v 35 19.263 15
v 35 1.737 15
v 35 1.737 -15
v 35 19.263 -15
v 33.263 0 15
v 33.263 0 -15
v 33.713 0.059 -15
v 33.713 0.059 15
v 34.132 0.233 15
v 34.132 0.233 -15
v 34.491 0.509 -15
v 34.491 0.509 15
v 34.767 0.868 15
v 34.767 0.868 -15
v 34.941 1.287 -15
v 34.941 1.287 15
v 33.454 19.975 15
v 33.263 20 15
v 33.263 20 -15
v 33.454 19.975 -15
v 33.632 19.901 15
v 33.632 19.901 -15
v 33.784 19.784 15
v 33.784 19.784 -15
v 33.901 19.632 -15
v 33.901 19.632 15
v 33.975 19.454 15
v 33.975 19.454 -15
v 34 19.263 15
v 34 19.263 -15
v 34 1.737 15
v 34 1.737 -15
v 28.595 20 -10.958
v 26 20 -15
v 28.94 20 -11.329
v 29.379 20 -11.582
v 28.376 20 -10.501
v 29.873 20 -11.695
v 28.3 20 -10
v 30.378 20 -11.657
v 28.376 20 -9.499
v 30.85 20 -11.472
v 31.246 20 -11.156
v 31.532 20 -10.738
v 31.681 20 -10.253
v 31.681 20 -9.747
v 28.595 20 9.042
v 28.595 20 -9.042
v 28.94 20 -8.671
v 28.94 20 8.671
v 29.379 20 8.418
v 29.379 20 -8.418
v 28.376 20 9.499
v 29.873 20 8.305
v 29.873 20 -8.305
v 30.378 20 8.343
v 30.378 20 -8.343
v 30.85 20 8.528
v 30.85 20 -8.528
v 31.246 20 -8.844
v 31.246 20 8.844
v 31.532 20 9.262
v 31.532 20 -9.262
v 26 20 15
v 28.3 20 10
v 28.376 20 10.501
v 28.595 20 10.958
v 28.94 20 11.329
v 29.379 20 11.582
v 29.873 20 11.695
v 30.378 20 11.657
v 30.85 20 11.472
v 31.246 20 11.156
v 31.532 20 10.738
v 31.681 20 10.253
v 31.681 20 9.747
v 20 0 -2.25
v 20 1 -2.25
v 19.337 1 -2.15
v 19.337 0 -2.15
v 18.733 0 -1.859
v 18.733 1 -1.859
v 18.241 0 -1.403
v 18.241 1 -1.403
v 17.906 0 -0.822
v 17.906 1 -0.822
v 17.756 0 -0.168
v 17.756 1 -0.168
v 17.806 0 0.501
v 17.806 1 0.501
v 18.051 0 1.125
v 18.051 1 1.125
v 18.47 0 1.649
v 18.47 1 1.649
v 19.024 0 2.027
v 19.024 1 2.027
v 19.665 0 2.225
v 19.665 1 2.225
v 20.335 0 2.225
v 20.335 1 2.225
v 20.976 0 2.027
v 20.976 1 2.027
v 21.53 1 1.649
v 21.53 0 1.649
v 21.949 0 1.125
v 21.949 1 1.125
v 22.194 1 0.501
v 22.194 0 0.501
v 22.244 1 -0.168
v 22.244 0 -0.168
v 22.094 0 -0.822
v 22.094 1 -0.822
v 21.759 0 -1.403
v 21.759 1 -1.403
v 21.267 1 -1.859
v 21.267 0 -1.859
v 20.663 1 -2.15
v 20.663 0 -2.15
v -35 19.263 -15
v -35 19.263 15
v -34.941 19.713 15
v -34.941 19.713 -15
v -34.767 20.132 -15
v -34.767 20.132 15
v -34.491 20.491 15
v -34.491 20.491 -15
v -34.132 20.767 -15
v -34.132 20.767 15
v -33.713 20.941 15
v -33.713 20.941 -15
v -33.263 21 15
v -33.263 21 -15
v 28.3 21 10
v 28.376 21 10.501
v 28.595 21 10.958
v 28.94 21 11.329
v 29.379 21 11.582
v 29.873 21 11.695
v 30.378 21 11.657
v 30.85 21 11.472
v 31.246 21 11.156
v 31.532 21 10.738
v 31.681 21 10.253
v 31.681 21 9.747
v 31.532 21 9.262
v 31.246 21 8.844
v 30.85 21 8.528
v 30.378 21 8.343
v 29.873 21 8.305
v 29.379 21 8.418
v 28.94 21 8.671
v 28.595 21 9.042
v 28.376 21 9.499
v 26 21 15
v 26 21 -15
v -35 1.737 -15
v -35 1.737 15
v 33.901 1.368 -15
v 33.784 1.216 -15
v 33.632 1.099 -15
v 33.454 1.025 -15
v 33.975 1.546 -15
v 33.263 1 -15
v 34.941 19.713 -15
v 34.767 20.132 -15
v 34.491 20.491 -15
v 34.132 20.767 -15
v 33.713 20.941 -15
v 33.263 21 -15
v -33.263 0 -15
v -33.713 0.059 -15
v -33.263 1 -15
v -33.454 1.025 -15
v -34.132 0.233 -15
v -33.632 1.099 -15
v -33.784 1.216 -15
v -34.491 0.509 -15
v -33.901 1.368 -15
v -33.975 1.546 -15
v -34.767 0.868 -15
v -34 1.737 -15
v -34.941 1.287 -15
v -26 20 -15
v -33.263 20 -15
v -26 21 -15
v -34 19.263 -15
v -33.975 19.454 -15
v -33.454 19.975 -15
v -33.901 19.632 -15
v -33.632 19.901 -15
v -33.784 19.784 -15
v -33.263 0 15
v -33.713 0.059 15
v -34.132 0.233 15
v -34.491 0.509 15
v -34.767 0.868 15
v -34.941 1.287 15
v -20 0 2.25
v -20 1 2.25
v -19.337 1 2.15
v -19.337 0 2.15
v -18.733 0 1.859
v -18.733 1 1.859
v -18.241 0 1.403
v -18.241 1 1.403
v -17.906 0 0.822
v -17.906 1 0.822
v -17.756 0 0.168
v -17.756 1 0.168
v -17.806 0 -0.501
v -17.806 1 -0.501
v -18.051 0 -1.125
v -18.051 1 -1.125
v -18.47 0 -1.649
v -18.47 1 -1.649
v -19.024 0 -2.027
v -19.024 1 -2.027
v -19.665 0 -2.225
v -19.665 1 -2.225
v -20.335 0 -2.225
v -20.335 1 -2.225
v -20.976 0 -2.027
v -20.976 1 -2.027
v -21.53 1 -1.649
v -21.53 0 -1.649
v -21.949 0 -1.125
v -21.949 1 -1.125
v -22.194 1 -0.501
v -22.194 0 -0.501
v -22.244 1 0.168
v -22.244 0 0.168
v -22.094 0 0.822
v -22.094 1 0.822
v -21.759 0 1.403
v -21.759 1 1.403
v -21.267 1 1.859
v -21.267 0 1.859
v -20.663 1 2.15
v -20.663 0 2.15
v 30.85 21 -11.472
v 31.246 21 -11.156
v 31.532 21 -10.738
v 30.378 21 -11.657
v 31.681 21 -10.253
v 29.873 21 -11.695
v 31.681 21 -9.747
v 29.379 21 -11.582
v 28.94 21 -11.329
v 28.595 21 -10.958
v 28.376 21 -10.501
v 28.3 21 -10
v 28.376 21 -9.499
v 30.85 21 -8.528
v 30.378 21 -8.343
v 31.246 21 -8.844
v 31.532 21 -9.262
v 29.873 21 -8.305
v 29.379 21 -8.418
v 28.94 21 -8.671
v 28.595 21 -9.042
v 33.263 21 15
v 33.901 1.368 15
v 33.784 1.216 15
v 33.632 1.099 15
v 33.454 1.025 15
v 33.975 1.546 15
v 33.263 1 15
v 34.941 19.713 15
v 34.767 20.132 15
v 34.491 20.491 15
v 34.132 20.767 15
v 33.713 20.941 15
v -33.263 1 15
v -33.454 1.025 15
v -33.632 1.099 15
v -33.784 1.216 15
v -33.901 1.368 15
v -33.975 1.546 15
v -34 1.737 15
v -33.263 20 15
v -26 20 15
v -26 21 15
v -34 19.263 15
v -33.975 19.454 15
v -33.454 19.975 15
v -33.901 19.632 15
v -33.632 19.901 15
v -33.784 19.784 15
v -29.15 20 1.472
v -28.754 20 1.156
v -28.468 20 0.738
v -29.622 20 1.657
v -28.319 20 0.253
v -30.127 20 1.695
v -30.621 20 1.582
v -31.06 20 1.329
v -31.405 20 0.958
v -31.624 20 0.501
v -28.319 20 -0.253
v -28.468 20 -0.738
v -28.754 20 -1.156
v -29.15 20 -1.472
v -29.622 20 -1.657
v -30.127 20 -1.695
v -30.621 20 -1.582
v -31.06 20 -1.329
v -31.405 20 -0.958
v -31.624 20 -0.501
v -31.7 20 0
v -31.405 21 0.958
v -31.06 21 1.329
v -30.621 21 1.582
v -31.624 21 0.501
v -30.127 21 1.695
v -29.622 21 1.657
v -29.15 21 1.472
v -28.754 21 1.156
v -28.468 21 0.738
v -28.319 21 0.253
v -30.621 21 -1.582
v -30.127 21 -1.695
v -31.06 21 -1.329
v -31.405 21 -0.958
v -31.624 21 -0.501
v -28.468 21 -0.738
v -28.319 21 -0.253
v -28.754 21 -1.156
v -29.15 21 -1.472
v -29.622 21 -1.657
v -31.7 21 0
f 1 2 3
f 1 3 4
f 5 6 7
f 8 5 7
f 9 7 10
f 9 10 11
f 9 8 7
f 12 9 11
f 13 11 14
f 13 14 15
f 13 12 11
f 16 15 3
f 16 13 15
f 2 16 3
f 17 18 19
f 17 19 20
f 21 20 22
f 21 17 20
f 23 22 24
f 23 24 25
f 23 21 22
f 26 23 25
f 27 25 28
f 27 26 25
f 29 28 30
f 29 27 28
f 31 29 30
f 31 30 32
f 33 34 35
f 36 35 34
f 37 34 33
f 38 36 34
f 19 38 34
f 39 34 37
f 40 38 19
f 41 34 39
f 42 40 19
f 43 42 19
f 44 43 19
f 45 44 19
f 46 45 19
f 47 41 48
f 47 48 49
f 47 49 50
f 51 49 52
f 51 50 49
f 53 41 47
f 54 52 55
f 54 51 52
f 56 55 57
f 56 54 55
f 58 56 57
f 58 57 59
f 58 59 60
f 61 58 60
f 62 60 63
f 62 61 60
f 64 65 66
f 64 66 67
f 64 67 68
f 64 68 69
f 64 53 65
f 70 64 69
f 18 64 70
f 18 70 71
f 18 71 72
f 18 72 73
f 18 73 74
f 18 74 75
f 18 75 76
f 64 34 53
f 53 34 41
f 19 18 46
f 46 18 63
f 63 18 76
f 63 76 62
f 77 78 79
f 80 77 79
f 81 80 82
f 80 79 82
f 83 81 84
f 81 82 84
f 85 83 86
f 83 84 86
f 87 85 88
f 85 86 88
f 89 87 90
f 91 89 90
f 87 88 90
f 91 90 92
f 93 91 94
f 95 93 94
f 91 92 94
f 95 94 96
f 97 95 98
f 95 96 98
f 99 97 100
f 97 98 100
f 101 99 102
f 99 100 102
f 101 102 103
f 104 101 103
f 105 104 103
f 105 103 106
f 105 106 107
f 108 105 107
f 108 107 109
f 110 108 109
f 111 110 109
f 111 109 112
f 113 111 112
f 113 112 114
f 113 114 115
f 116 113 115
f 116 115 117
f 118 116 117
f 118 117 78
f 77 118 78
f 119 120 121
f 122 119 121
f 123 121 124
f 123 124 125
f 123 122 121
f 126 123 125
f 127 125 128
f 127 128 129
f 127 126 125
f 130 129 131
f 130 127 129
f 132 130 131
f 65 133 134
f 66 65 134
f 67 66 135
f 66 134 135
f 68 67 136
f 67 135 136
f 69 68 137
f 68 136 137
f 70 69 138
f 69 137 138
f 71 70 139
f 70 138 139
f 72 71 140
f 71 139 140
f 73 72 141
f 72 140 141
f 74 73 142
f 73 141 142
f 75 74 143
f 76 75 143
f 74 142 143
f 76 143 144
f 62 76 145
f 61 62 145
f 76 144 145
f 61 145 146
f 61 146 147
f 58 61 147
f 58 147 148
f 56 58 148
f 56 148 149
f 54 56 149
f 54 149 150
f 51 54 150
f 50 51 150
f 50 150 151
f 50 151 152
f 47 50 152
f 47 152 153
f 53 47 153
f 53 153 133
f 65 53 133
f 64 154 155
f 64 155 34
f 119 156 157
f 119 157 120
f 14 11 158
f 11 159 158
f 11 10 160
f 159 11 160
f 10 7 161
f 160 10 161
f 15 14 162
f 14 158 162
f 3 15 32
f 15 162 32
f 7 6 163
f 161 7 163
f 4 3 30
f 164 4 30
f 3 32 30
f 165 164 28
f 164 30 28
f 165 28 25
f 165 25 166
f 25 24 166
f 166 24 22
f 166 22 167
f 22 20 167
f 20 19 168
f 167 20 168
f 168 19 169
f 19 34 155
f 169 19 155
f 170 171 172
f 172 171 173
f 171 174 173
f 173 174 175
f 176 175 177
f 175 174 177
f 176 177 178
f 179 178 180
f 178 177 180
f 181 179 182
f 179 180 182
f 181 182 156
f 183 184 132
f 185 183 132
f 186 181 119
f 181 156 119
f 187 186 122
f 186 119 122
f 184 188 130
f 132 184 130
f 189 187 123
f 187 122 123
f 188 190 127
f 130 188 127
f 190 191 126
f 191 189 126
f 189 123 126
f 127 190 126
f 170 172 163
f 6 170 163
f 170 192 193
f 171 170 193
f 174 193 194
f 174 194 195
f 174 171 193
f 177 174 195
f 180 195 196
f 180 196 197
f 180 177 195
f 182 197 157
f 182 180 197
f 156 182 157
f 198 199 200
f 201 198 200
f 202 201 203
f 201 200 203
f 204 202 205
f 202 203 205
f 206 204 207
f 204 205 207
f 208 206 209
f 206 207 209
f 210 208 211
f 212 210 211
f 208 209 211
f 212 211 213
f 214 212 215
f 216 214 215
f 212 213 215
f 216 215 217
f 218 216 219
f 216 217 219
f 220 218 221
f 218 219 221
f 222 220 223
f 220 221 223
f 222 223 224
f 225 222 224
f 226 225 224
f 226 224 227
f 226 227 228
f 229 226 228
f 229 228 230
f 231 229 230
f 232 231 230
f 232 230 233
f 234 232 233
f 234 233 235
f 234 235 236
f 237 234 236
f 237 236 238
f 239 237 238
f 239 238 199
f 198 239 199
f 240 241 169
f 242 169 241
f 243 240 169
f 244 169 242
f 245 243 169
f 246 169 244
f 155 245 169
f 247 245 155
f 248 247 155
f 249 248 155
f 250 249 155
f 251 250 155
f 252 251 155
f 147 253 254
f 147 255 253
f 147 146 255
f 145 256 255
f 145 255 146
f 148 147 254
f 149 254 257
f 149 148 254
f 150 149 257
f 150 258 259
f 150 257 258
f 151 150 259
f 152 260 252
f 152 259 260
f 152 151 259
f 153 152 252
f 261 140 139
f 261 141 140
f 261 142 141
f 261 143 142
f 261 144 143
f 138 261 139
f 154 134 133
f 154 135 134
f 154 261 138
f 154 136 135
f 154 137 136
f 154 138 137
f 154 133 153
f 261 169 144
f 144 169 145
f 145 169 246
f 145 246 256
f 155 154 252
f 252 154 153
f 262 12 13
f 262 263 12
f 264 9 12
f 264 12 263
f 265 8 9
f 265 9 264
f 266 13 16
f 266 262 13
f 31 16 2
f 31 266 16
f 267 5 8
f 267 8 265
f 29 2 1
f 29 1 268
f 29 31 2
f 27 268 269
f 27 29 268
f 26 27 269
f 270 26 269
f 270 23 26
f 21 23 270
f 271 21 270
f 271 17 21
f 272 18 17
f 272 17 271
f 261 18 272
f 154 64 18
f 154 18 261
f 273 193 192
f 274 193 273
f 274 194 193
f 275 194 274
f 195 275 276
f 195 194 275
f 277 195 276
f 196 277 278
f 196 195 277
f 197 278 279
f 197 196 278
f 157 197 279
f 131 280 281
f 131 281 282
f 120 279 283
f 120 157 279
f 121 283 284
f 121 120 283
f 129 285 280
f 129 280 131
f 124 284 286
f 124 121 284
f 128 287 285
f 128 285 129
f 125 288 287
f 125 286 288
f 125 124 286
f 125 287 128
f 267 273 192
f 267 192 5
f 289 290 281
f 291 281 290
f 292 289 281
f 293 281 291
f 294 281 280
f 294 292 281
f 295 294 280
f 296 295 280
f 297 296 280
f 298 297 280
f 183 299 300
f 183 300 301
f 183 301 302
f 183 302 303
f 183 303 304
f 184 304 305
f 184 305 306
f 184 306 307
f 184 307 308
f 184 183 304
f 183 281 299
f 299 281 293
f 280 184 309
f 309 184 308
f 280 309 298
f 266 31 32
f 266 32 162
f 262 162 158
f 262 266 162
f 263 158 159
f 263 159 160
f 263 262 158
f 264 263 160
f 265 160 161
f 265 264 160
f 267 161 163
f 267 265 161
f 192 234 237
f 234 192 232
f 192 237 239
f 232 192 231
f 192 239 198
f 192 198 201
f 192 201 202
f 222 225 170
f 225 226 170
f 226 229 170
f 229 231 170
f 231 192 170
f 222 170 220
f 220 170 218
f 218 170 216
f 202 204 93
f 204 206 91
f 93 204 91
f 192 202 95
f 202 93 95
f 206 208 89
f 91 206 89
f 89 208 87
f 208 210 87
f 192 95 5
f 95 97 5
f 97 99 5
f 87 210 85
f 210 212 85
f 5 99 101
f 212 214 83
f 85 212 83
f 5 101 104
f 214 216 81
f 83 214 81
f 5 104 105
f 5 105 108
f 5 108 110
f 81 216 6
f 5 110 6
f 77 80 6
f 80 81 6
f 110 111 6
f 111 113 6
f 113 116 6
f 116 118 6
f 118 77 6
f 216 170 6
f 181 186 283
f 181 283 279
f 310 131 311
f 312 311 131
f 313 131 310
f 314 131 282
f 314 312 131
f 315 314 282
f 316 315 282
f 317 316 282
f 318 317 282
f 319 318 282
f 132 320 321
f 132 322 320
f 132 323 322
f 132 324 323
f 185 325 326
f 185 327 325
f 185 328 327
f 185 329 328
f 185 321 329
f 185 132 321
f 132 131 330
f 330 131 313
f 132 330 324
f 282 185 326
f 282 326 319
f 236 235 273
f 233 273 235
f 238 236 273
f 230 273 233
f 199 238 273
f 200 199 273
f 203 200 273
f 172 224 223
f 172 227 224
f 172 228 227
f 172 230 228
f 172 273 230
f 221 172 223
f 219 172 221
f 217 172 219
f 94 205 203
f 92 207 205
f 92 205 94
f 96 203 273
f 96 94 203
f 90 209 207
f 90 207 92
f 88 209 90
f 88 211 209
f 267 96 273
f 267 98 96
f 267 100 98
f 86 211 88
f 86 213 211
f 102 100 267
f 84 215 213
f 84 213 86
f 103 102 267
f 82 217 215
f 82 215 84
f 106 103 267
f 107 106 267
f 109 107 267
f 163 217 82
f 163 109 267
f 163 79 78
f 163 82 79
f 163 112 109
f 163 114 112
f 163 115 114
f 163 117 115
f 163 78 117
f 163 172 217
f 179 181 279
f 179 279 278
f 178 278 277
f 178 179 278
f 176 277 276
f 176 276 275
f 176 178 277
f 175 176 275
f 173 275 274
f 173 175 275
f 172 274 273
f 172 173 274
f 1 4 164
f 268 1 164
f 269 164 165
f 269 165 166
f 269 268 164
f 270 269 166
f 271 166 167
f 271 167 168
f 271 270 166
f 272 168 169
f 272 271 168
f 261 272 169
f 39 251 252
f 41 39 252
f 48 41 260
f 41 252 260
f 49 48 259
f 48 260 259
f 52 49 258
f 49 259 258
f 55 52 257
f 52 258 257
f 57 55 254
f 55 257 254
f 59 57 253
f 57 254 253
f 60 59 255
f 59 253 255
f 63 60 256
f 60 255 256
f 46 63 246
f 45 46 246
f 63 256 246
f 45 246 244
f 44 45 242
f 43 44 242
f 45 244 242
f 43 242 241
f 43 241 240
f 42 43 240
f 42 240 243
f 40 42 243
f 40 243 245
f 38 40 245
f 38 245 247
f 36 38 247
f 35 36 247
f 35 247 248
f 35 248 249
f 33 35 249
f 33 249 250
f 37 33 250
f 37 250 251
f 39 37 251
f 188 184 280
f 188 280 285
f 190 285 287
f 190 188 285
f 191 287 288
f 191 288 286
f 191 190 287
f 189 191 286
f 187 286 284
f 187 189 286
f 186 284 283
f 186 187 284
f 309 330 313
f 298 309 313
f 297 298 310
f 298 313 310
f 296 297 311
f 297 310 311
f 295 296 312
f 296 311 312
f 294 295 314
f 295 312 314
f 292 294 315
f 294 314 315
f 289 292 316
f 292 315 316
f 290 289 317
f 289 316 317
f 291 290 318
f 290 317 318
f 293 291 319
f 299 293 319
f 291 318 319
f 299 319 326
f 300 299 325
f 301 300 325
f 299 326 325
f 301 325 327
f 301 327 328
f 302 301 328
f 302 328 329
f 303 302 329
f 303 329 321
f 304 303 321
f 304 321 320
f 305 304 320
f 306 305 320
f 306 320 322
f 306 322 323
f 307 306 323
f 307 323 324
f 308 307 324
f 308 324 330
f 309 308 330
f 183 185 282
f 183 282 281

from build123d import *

# Parameters (mm, degrees)
ESQUISSE1_W                             = 70
ESQUISSE1_H                             = 30
T_LE_DE_BASE_PLI_E1_DEPTH               = 1
T_LE_PLI_E_SUR_AR_TE1_STRIP_W           = 5.4732
T_LE_PLI_E_SUR_AR_TE1_STRIP_H           = 1
T_LE_PLI_E_SUR_AR_TE1_STRIP_CUT_DEPTH   = 30
T_LE_PLI_E_SUR_AR_TE1_STRIP_2_W         = 5.4732
T_LE_PLI_E_SUR_AR_TE1_STRIP_2_H         = 1
T_LE_PLI_E_SUR_AR_TE1_STRIP_CUT_2_DEPTH = 30
T_LE_PLI_E_SUR_AR_TE1_DEPTH             = 30
T_LE_PLI_E_SUR_AR_TE1_BEND_DEPTH        = 30
T_LE_PLI_E_SUR_AR_TE2_STRIP_W           = 5.4732
T_LE_PLI_E_SUR_AR_TE2_STRIP_H           = 1
T_LE_PLI_E_SUR_AR_TE2_STRIP_CUT_DEPTH   = 30
T_LE_PLI_E_SUR_AR_TE2_STRIP_2_W         = 5.4732
T_LE_PLI_E_SUR_AR_TE2_STRIP_2_H         = 1
T_LE_PLI_E_SUR_AR_TE2_STRIP_CUT_2_DEPTH = 30
T_LE_PLI_E_SUR_AR_TE2_DEPTH             = 30
T_LE_PLI_E_SUR_AR_TE2_BEND_DEPTH        = 30
ENL_V_MAT_EXTRU_1_REACH                 = 45.486
ESQUISSE12_R                            = 1.7
ENL_V_MAT_EXTRU_3_REACH                 = 45.012
ESQUISSE27_R                            = 2.25


# Sheet-metal steps are written as plain solids
with BuildPart() as part:
    # Esquisse1 → Tôle de base pliée1 (new body)
    with BuildSketch(Plane(origin=(0, 0, 0), x_dir=(1, 0, 0), z_dir=(0, 1, 0))):
        Rectangle(ESQUISSE1_W, ESQUISSE1_H)
    extrude(amount=T_LE_DE_BASE_PLI_E1_DEPTH)

    # Tôle pliée sur arête1 strip (across the edge) → Tôle pliée sur arête1 strip cut (cut)
    with BuildSketch(Plane(origin=(-35, 1, -15), x_dir=(1, 0, 0), z_dir=(0, 0, 1))):
        with Locations((-1, -0.5)):
            Rectangle(T_LE_PLI_E_SUR_AR_TE1_STRIP_W, T_LE_PLI_E_SUR_AR_TE1_STRIP_H)
    extrude(amount=T_LE_PLI_E_SUR_AR_TE1_STRIP_CUT_DEPTH, mode=Mode.SUBTRACT)

    # Tôle pliée sur arête1 strip 2 (across the edge) → Tôle pliée sur arête1 strip cut 2 (cut)
    with BuildSketch(Plane(origin=(35, 1, 15), x_dir=(-1, 0, 0), z_dir=(0, 0, -1))):
        with Locations((-1, -0.5)):
            Rectangle(T_LE_PLI_E_SUR_AR_TE1_STRIP_2_W, T_LE_PLI_E_SUR_AR_TE1_STRIP_2_H)
    extrude(amount=T_LE_PLI_E_SUR_AR_TE1_STRIP_CUT_2_DEPTH, mode=Mode.SUBTRACT)

    # Tôle pliée sur arête1 section (across the edge) → Tôle pliée sur arête1 (add)
    with BuildSketch(Plane(origin=(-35, 1, -15), x_dir=(1, 0, 0), z_dir=(0, 0, 1))):
        with BuildLine():
            Line((0, 0.7366), (0, 20))
            Line((0, 20), (1, 20))
            Line((1, 20), (1, 0.7366))
            ThreePointArc((1, 0.7366), (1.215745145, 0.215745145), (1.7366, 0))
            Line((1.7366, 0), (1.7366, -1))
            ThreePointArc((1.7366, -1), (0.508638364, -0.491361636), (0, 0.7366))
        make_face()
    extrude(amount=T_LE_PLI_E_SUR_AR_TE1_DEPTH)

    # Tôle pliée sur arête1 section 2 (across the edge) → Tôle pliée sur arête1 bend (add)
    with BuildSketch(Plane(origin=(35, 1, 15), x_dir=(-1, 0, 0), z_dir=(0, 0, -1))):
        with BuildLine():
            Line((0, 0.7366), (0, 20))
            Line((0, 20), (1, 20))
            Line((1, 20), (1, 0.7366))
            ThreePointArc((1, 0.7366), (1.215745145, 0.215745145), (1.7366, 0))
            Line((1.7366, 0), (1.7366, -1))
            ThreePointArc((1.7366, -1), (0.508638364, -0.491361636), (0, 0.7366))
        make_face()
    extrude(amount=T_LE_PLI_E_SUR_AR_TE1_BEND_DEPTH)

    # Tôle pliée sur arête2 strip (across the edge) → Tôle pliée sur arête2 strip cut (cut)
    with BuildSketch(Plane(origin=(-34, 21, -15), x_dir=(0, -1, 0), z_dir=(0, 0, 1))):
        with Locations((-1, -0.5)):
            Rectangle(T_LE_PLI_E_SUR_AR_TE2_STRIP_W, T_LE_PLI_E_SUR_AR_TE2_STRIP_H)
    extrude(amount=T_LE_PLI_E_SUR_AR_TE2_STRIP_CUT_DEPTH, mode=Mode.SUBTRACT)

    # Tôle pliée sur arête2 strip 2 (across the edge) → Tôle pliée sur arête2 strip cut 2 (cut)
    with BuildSketch(Plane(origin=(34, 21, 15), x_dir=(0, -1, 0), z_dir=(0, 0, -1))):
        with Locations((-1, -0.5)):
            Rectangle(T_LE_PLI_E_SUR_AR_TE2_STRIP_2_W, T_LE_PLI_E_SUR_AR_TE2_STRIP_2_H)
    extrude(amount=T_LE_PLI_E_SUR_AR_TE2_STRIP_CUT_2_DEPTH, mode=Mode.SUBTRACT)

    # Tôle pliée sur arête2 section (across the edge) → Tôle pliée sur arête2 (add)
    with BuildSketch(Plane(origin=(-34, 21, -15), x_dir=(0, -1, 0), z_dir=(0, 0, 1))):
        with BuildLine():
            Line((0, 0.7366), (0, 8))
            Line((0, 8), (1, 8))
            Line((1, 8), (1, 0.7366))
            ThreePointArc((1, 0.7366), (1.215745145, 0.215745145), (1.7366, 0))
            Line((1.7366, 0), (1.7366, -1))
            ThreePointArc((1.7366, -1), (0.508638364, -0.491361636), (0, 0.7366))
        make_face()
    extrude(amount=T_LE_PLI_E_SUR_AR_TE2_DEPTH)

    # Tôle pliée sur arête2 section 2 (across the edge) → Tôle pliée sur arête2 bend (add)
    with BuildSketch(Plane(origin=(34, 21, 15), x_dir=(0, -1, 0), z_dir=(0, 0, -1))):
        with BuildLine():
            Line((0, 0.7366), (0, 8))
            Line((0, 8), (1, 8))
            Line((1, 8), (1, 0.7366))
            ThreePointArc((1, 0.7366), (1.215745145, 0.215745145), (1.7366, 0))
            Line((1.7366, 0), (1.7366, -1))
            ThreePointArc((1.7366, -1), (0.508638364, -0.491361636), (0, 0.7366))
        make_face()
    extrude(amount=T_LE_PLI_E_SUR_AR_TE2_BEND_DEPTH)

    # Esquisse12 → Enlèv. mat.-Extru.1 (cut, up to next)
    with BuildSketch(Plane(origin=(0, 21, 0), x_dir=(1, 0, 0), z_dir=(0, 1, 0)), mode=Mode.PRIVATE) as enl_v_mat_extru_1_sk1:
        with Locations(Location((-30, 0, 0), (0, 0, 180))):
            Circle(ESQUISSE12_R)
    enl_v_mat_extru_1_tool1 = extrude(enl_v_mat_extru_1_sk1.sketch, amount=-ENL_V_MAT_EXTRU_1_REACH, mode=Mode.PRIVATE) & part.part
    # Esquisse12 → Enlèv. mat.-Extru.1 (cut, up to next)
    with BuildSketch(Plane(origin=(0, 21, 0), x_dir=(1, 0, 0), z_dir=(0, 1, 0)), mode=Mode.PRIVATE) as enl_v_mat_extru_1_sk2:
        with Locations(Location((30, 10, 0), (0, 0, 180))):
            Circle(ESQUISSE12_R)
    enl_v_mat_extru_1_tool2 = extrude(enl_v_mat_extru_1_sk2.sketch, amount=-ENL_V_MAT_EXTRU_1_REACH, mode=Mode.PRIVATE) & part.part
    # Esquisse12 → Enlèv. mat.-Extru.1 (cut, up to next)
    with BuildSketch(Plane(origin=(0, 21, 0), x_dir=(1, 0, 0), z_dir=(0, 1, 0)), mode=Mode.PRIVATE) as enl_v_mat_extru_1_sk3:
        with Locations(Location((30, -10, 0), (0, 0, 180))):
            Circle(ESQUISSE12_R)
    enl_v_mat_extru_1_tool3 = extrude(enl_v_mat_extru_1_sk3.sketch, amount=-ENL_V_MAT_EXTRU_1_REACH, mode=Mode.PRIVATE) & part.part
    add(enl_v_mat_extru_1_tool1.solids().sort_by_distance((-30, 21, 0))[0], mode=Mode.SUBTRACT)
    add(enl_v_mat_extru_1_tool2.solids().sort_by_distance((30, 21, -10))[0], mode=Mode.SUBTRACT)
    add(enl_v_mat_extru_1_tool3.solids().sort_by_distance((30, 21, 10))[0], mode=Mode.SUBTRACT)

    # Esquisse27 → Enlèv. mat.-Extru.3 (cut, up to next)
    with BuildSketch(Plane(origin=(0, 1, 0), x_dir=(1, 0, 0), z_dir=(0, 1, 0)), mode=Mode.PRIVATE) as enl_v_mat_extru_3_sk1:
        with Locations(Location((-20, 0, 0), (0, 0, 270))):
            Circle(ESQUISSE27_R)
    enl_v_mat_extru_3_tool1 = extrude(enl_v_mat_extru_3_sk1.sketch, amount=-ENL_V_MAT_EXTRU_3_REACH, mode=Mode.PRIVATE) & part.part
    # Esquisse27 → Enlèv. mat.-Extru.3 (cut, up to next)
    with BuildSketch(Plane(origin=(0, 1, 0), x_dir=(1, 0, 0), z_dir=(0, 1, 0)), mode=Mode.PRIVATE) as enl_v_mat_extru_3_sk2:
        with Locations(Location((20, 0, 0), (0, 0, 90))):
            Circle(ESQUISSE27_R)
    enl_v_mat_extru_3_tool2 = extrude(enl_v_mat_extru_3_sk2.sketch, amount=-ENL_V_MAT_EXTRU_3_REACH, mode=Mode.PRIVATE) & part.part
    add(enl_v_mat_extru_3_tool1.solids().sort_by_distance((-20, 1, 0))[0], mode=Mode.SUBTRACT)
    add(enl_v_mat_extru_3_tool2.solids().sort_by_distance((20, 1, 0))[0], mode=Mode.SUBTRACT)


solid = part.part
